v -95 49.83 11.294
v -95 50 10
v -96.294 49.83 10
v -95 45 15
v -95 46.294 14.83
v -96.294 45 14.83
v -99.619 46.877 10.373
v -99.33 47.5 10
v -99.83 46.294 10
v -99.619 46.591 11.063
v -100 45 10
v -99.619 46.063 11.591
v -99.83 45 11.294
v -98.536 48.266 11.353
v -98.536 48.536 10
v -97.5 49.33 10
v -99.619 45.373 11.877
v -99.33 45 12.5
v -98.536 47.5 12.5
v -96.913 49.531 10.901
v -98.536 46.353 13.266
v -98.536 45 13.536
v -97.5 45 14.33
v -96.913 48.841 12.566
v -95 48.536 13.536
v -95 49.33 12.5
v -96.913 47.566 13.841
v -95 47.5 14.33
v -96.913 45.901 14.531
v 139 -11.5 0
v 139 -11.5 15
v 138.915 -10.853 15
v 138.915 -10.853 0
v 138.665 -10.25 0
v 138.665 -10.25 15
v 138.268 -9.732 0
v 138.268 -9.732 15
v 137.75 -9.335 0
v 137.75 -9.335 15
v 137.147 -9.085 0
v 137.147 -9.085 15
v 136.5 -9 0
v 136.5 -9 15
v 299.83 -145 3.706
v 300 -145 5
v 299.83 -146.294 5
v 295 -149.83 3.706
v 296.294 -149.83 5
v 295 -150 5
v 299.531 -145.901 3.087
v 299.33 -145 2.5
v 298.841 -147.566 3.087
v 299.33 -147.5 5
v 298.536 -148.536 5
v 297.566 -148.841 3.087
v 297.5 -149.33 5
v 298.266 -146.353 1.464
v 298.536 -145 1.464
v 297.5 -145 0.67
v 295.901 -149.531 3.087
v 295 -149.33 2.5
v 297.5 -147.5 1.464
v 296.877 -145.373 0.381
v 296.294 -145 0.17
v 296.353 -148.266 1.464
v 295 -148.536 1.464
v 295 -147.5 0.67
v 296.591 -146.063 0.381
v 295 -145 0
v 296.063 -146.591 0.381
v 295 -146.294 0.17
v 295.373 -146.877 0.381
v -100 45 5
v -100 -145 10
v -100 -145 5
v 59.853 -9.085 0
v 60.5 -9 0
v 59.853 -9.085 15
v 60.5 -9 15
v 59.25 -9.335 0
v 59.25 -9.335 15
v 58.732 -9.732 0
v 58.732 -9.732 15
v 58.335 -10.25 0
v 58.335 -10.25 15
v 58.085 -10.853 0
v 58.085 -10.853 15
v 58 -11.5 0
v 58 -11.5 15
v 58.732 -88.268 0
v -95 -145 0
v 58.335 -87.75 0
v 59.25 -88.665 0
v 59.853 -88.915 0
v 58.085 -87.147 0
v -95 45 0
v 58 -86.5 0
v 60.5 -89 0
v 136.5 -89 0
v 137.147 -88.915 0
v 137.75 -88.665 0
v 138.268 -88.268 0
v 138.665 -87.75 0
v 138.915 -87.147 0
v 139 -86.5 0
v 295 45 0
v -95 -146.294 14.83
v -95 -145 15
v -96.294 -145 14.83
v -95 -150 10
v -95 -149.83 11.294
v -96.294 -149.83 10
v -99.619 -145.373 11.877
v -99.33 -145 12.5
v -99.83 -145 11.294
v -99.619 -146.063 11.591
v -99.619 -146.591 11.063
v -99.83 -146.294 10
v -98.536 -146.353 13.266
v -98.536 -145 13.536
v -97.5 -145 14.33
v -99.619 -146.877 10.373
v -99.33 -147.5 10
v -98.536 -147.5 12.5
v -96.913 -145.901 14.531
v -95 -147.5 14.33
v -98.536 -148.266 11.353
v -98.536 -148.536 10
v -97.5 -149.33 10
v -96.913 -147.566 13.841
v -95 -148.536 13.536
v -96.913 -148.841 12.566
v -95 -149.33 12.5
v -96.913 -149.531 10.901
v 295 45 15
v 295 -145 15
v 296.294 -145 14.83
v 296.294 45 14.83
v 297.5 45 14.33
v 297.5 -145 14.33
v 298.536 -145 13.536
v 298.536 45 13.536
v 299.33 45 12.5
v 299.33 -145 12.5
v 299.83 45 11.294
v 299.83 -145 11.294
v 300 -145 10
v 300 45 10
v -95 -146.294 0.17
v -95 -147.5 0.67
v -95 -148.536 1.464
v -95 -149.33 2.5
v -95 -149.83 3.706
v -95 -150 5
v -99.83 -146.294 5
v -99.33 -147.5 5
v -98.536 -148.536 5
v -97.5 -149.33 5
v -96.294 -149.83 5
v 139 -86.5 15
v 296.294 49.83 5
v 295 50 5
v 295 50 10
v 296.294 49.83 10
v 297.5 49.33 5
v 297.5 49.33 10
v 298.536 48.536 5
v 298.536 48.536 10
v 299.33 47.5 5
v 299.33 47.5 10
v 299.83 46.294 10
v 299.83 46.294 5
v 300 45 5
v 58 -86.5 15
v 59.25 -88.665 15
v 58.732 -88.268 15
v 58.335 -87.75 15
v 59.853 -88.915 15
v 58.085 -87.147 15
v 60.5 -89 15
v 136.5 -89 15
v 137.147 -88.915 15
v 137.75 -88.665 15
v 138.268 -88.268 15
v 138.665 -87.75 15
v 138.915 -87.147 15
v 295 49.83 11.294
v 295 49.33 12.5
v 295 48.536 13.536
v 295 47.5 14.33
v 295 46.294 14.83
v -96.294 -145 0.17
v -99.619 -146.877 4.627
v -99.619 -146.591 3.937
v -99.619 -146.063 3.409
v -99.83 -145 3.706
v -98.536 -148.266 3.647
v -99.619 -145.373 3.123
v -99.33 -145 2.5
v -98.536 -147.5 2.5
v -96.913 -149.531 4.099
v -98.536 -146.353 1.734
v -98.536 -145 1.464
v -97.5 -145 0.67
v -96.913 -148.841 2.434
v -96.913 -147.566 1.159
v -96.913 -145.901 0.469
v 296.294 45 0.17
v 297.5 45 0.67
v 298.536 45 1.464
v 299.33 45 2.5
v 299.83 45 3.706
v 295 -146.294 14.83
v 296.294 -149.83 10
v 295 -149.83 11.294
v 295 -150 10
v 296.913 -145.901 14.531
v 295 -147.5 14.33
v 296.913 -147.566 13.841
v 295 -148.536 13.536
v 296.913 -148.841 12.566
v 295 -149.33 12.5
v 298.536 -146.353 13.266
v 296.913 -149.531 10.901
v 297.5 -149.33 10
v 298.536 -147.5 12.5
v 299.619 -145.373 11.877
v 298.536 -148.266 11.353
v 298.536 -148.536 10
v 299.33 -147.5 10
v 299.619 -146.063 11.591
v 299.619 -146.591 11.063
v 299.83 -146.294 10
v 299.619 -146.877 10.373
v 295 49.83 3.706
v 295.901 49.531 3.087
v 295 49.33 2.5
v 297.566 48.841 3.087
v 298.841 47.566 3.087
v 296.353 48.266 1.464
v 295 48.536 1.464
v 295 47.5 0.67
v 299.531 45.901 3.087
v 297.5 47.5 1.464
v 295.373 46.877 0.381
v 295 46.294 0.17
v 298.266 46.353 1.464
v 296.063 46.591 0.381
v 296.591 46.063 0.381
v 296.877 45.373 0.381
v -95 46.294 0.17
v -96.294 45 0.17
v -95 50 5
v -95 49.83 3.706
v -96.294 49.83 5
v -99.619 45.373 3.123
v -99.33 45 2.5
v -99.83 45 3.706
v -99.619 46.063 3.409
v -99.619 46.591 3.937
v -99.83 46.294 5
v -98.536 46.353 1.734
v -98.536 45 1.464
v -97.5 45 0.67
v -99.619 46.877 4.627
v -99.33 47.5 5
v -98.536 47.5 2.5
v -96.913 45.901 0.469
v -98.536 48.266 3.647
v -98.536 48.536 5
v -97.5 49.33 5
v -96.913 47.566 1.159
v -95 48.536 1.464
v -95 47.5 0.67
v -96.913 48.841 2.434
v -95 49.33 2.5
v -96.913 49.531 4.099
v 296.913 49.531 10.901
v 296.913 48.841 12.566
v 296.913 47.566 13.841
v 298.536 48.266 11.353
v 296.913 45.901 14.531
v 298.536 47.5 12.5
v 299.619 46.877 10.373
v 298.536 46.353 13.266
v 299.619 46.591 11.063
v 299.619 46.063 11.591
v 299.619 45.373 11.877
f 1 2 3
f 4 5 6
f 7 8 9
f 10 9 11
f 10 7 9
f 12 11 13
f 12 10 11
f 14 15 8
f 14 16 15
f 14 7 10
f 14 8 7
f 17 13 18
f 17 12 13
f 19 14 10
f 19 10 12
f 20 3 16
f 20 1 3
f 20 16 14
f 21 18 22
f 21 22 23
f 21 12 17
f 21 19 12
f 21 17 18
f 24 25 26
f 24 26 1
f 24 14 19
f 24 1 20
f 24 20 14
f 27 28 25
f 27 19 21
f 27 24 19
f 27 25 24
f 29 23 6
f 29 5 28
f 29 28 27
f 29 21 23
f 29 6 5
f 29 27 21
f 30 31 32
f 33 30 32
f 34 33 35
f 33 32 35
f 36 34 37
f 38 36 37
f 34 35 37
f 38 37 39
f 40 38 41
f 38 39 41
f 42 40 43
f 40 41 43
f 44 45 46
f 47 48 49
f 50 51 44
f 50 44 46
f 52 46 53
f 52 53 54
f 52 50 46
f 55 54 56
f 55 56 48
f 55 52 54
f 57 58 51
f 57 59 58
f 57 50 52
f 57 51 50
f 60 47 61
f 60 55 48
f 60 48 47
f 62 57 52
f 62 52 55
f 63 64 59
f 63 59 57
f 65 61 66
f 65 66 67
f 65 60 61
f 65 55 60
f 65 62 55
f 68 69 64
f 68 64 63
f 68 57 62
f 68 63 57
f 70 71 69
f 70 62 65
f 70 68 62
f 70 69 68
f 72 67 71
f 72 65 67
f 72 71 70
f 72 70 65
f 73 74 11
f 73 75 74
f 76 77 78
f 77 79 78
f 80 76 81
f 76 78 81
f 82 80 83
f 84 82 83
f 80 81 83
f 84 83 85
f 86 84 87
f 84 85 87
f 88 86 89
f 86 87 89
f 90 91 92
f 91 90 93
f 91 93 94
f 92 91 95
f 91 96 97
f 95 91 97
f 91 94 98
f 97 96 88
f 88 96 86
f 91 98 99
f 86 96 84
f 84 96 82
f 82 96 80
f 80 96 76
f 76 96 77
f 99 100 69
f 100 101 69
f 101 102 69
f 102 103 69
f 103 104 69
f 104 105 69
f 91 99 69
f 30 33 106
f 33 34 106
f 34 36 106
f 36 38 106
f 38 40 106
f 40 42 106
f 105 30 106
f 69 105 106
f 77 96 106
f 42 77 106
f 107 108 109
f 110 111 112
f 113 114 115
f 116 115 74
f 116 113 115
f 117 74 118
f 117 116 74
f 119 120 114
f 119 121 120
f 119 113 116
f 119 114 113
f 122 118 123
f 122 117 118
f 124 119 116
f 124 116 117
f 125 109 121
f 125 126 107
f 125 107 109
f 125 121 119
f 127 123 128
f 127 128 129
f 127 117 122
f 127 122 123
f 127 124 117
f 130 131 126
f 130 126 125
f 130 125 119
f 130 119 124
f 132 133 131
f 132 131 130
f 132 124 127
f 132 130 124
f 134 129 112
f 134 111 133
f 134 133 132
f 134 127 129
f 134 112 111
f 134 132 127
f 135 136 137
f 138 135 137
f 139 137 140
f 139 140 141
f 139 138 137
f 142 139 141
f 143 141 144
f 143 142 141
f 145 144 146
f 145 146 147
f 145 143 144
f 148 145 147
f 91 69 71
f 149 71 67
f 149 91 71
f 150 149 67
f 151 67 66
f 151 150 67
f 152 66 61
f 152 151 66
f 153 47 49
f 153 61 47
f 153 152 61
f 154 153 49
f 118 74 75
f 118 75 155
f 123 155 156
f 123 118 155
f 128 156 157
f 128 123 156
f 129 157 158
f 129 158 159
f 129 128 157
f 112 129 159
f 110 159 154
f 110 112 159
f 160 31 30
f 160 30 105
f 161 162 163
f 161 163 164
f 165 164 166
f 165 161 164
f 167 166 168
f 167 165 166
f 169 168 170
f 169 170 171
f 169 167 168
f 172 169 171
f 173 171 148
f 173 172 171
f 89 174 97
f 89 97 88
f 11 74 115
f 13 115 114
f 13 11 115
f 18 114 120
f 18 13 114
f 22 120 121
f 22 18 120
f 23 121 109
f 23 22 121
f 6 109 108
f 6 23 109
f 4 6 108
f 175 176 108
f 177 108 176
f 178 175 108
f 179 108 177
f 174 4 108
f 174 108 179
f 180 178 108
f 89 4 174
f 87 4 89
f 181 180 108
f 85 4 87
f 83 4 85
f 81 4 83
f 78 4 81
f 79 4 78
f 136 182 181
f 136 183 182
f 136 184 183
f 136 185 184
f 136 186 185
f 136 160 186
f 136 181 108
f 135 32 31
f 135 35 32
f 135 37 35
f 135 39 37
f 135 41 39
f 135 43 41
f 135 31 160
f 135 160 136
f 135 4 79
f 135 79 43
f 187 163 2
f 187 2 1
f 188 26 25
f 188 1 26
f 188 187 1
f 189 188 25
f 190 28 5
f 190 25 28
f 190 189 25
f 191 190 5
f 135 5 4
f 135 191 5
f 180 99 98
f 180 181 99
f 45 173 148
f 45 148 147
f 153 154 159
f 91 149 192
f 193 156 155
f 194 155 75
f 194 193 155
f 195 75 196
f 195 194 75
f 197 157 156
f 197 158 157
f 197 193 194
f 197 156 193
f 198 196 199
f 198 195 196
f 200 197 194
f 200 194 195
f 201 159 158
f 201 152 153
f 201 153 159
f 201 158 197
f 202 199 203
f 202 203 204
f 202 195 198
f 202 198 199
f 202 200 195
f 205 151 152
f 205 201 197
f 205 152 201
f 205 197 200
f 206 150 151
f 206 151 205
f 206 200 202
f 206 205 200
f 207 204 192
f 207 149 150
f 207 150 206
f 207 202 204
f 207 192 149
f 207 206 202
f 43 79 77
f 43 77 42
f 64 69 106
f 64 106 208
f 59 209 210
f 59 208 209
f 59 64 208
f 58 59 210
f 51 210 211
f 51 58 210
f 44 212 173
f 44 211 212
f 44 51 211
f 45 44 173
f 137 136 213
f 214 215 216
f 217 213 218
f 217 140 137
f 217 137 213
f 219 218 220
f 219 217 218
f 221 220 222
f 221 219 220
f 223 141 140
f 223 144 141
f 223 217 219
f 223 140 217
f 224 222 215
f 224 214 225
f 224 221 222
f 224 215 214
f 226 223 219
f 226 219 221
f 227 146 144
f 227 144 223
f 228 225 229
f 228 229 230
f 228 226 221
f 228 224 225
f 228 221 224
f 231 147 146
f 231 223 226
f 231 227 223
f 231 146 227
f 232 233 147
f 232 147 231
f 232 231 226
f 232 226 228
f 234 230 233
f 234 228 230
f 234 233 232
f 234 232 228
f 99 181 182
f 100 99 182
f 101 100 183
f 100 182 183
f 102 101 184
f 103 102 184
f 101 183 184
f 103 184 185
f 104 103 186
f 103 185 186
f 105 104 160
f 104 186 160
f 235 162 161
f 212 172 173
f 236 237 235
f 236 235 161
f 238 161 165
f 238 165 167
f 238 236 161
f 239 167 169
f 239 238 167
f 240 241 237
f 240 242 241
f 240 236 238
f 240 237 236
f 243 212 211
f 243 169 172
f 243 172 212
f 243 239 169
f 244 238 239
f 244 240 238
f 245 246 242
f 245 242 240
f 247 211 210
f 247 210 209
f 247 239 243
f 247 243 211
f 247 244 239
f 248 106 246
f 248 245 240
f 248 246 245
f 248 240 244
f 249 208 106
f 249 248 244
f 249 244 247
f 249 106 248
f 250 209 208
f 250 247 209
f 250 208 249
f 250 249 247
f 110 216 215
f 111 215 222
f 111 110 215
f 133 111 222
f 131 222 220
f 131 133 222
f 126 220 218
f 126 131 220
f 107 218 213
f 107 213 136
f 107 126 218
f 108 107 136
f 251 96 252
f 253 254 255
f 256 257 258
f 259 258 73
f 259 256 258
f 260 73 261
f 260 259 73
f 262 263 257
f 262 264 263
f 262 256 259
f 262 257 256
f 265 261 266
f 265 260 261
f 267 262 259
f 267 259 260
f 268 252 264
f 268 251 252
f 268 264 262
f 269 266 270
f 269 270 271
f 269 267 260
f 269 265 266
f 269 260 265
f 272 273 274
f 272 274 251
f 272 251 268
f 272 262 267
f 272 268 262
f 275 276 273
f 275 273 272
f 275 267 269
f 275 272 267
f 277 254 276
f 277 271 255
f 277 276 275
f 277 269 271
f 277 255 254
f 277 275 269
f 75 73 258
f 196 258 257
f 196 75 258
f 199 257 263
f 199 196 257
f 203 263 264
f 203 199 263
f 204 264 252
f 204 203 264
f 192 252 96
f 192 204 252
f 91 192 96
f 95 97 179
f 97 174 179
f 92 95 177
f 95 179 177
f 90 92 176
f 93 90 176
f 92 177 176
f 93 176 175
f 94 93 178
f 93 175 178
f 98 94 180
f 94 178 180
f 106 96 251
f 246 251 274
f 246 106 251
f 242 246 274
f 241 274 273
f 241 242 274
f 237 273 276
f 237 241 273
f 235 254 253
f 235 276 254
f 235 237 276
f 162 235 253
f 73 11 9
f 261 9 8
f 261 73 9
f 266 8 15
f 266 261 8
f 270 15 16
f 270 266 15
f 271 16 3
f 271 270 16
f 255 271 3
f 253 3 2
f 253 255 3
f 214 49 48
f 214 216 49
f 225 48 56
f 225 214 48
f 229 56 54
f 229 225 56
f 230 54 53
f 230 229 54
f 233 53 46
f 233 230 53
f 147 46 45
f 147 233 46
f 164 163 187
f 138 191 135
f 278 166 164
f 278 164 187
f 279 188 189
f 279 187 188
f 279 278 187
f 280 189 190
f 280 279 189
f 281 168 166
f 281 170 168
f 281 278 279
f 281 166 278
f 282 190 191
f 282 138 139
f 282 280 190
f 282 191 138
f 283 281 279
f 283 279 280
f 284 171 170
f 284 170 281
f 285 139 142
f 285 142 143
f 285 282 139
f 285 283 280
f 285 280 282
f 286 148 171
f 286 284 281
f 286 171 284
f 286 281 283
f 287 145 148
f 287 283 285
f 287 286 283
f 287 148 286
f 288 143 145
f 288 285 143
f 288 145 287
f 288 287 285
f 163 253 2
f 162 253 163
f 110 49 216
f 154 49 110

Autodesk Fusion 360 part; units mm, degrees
sketch "Sketch1" plane through (0, 0, 0) normal (0, 0, 1) x (1, 0, 0)
  line L0 (-100, 50) -> (300, 50)
  line L1 (300, 50) -> (300, -150)
  line L2 (300, -150) -> (-100, -150)
  line L3 (-100, -150) -> (-100, 50)
  dimension "d1" = 200
extrude "Extrude1" add sketch "Sketch1" along normal blind 15
ref_plane "WorkPlane1" through (100, -50, 15) normal (0, 0, 1) x (1, 0, 0)
sketch "Sketch2" plane through (0, 0, 15) normal (0, 0, 1) x (1, 0, 0)
  line L0 (60.5, -9) -> (136.5, -9)
  line L1 (139, -11.5) -> (139, -86.5)
  line L2 (136.5, -89) -> (60.5, -89)
  line L3 (58, -86.5) -> (58, -11.5)
  arc A0 (58, -86.5) -> (60.5, -89) centre (60.5, -86.5) ccw
  arc A1 (136.5, -89) -> (139, -86.5) centre (136.5, -86.5) ccw
  arc A2 (139, -11.5) -> (136.5, -9) centre (136.5, -11.5) ccw
  arc A3 (60.5, -9) -> (58, -11.5) centre (60.5, -11.5) ccw
  dimension "d6" = 2.5
extrude "Extrude2" cut sketch "Sketch2" against normal blind 70
fillet "Fillet1" radius 5 1 edges at (100, 50, 15)
fillet "Fillet2" radius 5 1 edges at (100, -150, 15)
fillet "Fillet3" radius 5 5 edges at (300, -150, 5) (300, -148.5355, 13.5355) (300, -50, 15) (300, 48.5355, 13.5355) (300, 50, 5)
fillet "Fillet4" radius 5 5 edges at (97.5, 50, 0) (298.5355, 48.5355, 0) (300, -50, 0) (298.5355, -148.5355, 0) (97.5, -150, 0)
fillet "Fillet5" radius 5 8 edges at (-100, -150, 7.5) (-100, -148.5355, 1.4645) (-100, -50, 0) (-100, 48.5355, 1.4645) (-100, 50, 7.5) (-100, 48.5355, 13.5355) (-100, -50, 15) (-100, -148.5355, 13.5355)
